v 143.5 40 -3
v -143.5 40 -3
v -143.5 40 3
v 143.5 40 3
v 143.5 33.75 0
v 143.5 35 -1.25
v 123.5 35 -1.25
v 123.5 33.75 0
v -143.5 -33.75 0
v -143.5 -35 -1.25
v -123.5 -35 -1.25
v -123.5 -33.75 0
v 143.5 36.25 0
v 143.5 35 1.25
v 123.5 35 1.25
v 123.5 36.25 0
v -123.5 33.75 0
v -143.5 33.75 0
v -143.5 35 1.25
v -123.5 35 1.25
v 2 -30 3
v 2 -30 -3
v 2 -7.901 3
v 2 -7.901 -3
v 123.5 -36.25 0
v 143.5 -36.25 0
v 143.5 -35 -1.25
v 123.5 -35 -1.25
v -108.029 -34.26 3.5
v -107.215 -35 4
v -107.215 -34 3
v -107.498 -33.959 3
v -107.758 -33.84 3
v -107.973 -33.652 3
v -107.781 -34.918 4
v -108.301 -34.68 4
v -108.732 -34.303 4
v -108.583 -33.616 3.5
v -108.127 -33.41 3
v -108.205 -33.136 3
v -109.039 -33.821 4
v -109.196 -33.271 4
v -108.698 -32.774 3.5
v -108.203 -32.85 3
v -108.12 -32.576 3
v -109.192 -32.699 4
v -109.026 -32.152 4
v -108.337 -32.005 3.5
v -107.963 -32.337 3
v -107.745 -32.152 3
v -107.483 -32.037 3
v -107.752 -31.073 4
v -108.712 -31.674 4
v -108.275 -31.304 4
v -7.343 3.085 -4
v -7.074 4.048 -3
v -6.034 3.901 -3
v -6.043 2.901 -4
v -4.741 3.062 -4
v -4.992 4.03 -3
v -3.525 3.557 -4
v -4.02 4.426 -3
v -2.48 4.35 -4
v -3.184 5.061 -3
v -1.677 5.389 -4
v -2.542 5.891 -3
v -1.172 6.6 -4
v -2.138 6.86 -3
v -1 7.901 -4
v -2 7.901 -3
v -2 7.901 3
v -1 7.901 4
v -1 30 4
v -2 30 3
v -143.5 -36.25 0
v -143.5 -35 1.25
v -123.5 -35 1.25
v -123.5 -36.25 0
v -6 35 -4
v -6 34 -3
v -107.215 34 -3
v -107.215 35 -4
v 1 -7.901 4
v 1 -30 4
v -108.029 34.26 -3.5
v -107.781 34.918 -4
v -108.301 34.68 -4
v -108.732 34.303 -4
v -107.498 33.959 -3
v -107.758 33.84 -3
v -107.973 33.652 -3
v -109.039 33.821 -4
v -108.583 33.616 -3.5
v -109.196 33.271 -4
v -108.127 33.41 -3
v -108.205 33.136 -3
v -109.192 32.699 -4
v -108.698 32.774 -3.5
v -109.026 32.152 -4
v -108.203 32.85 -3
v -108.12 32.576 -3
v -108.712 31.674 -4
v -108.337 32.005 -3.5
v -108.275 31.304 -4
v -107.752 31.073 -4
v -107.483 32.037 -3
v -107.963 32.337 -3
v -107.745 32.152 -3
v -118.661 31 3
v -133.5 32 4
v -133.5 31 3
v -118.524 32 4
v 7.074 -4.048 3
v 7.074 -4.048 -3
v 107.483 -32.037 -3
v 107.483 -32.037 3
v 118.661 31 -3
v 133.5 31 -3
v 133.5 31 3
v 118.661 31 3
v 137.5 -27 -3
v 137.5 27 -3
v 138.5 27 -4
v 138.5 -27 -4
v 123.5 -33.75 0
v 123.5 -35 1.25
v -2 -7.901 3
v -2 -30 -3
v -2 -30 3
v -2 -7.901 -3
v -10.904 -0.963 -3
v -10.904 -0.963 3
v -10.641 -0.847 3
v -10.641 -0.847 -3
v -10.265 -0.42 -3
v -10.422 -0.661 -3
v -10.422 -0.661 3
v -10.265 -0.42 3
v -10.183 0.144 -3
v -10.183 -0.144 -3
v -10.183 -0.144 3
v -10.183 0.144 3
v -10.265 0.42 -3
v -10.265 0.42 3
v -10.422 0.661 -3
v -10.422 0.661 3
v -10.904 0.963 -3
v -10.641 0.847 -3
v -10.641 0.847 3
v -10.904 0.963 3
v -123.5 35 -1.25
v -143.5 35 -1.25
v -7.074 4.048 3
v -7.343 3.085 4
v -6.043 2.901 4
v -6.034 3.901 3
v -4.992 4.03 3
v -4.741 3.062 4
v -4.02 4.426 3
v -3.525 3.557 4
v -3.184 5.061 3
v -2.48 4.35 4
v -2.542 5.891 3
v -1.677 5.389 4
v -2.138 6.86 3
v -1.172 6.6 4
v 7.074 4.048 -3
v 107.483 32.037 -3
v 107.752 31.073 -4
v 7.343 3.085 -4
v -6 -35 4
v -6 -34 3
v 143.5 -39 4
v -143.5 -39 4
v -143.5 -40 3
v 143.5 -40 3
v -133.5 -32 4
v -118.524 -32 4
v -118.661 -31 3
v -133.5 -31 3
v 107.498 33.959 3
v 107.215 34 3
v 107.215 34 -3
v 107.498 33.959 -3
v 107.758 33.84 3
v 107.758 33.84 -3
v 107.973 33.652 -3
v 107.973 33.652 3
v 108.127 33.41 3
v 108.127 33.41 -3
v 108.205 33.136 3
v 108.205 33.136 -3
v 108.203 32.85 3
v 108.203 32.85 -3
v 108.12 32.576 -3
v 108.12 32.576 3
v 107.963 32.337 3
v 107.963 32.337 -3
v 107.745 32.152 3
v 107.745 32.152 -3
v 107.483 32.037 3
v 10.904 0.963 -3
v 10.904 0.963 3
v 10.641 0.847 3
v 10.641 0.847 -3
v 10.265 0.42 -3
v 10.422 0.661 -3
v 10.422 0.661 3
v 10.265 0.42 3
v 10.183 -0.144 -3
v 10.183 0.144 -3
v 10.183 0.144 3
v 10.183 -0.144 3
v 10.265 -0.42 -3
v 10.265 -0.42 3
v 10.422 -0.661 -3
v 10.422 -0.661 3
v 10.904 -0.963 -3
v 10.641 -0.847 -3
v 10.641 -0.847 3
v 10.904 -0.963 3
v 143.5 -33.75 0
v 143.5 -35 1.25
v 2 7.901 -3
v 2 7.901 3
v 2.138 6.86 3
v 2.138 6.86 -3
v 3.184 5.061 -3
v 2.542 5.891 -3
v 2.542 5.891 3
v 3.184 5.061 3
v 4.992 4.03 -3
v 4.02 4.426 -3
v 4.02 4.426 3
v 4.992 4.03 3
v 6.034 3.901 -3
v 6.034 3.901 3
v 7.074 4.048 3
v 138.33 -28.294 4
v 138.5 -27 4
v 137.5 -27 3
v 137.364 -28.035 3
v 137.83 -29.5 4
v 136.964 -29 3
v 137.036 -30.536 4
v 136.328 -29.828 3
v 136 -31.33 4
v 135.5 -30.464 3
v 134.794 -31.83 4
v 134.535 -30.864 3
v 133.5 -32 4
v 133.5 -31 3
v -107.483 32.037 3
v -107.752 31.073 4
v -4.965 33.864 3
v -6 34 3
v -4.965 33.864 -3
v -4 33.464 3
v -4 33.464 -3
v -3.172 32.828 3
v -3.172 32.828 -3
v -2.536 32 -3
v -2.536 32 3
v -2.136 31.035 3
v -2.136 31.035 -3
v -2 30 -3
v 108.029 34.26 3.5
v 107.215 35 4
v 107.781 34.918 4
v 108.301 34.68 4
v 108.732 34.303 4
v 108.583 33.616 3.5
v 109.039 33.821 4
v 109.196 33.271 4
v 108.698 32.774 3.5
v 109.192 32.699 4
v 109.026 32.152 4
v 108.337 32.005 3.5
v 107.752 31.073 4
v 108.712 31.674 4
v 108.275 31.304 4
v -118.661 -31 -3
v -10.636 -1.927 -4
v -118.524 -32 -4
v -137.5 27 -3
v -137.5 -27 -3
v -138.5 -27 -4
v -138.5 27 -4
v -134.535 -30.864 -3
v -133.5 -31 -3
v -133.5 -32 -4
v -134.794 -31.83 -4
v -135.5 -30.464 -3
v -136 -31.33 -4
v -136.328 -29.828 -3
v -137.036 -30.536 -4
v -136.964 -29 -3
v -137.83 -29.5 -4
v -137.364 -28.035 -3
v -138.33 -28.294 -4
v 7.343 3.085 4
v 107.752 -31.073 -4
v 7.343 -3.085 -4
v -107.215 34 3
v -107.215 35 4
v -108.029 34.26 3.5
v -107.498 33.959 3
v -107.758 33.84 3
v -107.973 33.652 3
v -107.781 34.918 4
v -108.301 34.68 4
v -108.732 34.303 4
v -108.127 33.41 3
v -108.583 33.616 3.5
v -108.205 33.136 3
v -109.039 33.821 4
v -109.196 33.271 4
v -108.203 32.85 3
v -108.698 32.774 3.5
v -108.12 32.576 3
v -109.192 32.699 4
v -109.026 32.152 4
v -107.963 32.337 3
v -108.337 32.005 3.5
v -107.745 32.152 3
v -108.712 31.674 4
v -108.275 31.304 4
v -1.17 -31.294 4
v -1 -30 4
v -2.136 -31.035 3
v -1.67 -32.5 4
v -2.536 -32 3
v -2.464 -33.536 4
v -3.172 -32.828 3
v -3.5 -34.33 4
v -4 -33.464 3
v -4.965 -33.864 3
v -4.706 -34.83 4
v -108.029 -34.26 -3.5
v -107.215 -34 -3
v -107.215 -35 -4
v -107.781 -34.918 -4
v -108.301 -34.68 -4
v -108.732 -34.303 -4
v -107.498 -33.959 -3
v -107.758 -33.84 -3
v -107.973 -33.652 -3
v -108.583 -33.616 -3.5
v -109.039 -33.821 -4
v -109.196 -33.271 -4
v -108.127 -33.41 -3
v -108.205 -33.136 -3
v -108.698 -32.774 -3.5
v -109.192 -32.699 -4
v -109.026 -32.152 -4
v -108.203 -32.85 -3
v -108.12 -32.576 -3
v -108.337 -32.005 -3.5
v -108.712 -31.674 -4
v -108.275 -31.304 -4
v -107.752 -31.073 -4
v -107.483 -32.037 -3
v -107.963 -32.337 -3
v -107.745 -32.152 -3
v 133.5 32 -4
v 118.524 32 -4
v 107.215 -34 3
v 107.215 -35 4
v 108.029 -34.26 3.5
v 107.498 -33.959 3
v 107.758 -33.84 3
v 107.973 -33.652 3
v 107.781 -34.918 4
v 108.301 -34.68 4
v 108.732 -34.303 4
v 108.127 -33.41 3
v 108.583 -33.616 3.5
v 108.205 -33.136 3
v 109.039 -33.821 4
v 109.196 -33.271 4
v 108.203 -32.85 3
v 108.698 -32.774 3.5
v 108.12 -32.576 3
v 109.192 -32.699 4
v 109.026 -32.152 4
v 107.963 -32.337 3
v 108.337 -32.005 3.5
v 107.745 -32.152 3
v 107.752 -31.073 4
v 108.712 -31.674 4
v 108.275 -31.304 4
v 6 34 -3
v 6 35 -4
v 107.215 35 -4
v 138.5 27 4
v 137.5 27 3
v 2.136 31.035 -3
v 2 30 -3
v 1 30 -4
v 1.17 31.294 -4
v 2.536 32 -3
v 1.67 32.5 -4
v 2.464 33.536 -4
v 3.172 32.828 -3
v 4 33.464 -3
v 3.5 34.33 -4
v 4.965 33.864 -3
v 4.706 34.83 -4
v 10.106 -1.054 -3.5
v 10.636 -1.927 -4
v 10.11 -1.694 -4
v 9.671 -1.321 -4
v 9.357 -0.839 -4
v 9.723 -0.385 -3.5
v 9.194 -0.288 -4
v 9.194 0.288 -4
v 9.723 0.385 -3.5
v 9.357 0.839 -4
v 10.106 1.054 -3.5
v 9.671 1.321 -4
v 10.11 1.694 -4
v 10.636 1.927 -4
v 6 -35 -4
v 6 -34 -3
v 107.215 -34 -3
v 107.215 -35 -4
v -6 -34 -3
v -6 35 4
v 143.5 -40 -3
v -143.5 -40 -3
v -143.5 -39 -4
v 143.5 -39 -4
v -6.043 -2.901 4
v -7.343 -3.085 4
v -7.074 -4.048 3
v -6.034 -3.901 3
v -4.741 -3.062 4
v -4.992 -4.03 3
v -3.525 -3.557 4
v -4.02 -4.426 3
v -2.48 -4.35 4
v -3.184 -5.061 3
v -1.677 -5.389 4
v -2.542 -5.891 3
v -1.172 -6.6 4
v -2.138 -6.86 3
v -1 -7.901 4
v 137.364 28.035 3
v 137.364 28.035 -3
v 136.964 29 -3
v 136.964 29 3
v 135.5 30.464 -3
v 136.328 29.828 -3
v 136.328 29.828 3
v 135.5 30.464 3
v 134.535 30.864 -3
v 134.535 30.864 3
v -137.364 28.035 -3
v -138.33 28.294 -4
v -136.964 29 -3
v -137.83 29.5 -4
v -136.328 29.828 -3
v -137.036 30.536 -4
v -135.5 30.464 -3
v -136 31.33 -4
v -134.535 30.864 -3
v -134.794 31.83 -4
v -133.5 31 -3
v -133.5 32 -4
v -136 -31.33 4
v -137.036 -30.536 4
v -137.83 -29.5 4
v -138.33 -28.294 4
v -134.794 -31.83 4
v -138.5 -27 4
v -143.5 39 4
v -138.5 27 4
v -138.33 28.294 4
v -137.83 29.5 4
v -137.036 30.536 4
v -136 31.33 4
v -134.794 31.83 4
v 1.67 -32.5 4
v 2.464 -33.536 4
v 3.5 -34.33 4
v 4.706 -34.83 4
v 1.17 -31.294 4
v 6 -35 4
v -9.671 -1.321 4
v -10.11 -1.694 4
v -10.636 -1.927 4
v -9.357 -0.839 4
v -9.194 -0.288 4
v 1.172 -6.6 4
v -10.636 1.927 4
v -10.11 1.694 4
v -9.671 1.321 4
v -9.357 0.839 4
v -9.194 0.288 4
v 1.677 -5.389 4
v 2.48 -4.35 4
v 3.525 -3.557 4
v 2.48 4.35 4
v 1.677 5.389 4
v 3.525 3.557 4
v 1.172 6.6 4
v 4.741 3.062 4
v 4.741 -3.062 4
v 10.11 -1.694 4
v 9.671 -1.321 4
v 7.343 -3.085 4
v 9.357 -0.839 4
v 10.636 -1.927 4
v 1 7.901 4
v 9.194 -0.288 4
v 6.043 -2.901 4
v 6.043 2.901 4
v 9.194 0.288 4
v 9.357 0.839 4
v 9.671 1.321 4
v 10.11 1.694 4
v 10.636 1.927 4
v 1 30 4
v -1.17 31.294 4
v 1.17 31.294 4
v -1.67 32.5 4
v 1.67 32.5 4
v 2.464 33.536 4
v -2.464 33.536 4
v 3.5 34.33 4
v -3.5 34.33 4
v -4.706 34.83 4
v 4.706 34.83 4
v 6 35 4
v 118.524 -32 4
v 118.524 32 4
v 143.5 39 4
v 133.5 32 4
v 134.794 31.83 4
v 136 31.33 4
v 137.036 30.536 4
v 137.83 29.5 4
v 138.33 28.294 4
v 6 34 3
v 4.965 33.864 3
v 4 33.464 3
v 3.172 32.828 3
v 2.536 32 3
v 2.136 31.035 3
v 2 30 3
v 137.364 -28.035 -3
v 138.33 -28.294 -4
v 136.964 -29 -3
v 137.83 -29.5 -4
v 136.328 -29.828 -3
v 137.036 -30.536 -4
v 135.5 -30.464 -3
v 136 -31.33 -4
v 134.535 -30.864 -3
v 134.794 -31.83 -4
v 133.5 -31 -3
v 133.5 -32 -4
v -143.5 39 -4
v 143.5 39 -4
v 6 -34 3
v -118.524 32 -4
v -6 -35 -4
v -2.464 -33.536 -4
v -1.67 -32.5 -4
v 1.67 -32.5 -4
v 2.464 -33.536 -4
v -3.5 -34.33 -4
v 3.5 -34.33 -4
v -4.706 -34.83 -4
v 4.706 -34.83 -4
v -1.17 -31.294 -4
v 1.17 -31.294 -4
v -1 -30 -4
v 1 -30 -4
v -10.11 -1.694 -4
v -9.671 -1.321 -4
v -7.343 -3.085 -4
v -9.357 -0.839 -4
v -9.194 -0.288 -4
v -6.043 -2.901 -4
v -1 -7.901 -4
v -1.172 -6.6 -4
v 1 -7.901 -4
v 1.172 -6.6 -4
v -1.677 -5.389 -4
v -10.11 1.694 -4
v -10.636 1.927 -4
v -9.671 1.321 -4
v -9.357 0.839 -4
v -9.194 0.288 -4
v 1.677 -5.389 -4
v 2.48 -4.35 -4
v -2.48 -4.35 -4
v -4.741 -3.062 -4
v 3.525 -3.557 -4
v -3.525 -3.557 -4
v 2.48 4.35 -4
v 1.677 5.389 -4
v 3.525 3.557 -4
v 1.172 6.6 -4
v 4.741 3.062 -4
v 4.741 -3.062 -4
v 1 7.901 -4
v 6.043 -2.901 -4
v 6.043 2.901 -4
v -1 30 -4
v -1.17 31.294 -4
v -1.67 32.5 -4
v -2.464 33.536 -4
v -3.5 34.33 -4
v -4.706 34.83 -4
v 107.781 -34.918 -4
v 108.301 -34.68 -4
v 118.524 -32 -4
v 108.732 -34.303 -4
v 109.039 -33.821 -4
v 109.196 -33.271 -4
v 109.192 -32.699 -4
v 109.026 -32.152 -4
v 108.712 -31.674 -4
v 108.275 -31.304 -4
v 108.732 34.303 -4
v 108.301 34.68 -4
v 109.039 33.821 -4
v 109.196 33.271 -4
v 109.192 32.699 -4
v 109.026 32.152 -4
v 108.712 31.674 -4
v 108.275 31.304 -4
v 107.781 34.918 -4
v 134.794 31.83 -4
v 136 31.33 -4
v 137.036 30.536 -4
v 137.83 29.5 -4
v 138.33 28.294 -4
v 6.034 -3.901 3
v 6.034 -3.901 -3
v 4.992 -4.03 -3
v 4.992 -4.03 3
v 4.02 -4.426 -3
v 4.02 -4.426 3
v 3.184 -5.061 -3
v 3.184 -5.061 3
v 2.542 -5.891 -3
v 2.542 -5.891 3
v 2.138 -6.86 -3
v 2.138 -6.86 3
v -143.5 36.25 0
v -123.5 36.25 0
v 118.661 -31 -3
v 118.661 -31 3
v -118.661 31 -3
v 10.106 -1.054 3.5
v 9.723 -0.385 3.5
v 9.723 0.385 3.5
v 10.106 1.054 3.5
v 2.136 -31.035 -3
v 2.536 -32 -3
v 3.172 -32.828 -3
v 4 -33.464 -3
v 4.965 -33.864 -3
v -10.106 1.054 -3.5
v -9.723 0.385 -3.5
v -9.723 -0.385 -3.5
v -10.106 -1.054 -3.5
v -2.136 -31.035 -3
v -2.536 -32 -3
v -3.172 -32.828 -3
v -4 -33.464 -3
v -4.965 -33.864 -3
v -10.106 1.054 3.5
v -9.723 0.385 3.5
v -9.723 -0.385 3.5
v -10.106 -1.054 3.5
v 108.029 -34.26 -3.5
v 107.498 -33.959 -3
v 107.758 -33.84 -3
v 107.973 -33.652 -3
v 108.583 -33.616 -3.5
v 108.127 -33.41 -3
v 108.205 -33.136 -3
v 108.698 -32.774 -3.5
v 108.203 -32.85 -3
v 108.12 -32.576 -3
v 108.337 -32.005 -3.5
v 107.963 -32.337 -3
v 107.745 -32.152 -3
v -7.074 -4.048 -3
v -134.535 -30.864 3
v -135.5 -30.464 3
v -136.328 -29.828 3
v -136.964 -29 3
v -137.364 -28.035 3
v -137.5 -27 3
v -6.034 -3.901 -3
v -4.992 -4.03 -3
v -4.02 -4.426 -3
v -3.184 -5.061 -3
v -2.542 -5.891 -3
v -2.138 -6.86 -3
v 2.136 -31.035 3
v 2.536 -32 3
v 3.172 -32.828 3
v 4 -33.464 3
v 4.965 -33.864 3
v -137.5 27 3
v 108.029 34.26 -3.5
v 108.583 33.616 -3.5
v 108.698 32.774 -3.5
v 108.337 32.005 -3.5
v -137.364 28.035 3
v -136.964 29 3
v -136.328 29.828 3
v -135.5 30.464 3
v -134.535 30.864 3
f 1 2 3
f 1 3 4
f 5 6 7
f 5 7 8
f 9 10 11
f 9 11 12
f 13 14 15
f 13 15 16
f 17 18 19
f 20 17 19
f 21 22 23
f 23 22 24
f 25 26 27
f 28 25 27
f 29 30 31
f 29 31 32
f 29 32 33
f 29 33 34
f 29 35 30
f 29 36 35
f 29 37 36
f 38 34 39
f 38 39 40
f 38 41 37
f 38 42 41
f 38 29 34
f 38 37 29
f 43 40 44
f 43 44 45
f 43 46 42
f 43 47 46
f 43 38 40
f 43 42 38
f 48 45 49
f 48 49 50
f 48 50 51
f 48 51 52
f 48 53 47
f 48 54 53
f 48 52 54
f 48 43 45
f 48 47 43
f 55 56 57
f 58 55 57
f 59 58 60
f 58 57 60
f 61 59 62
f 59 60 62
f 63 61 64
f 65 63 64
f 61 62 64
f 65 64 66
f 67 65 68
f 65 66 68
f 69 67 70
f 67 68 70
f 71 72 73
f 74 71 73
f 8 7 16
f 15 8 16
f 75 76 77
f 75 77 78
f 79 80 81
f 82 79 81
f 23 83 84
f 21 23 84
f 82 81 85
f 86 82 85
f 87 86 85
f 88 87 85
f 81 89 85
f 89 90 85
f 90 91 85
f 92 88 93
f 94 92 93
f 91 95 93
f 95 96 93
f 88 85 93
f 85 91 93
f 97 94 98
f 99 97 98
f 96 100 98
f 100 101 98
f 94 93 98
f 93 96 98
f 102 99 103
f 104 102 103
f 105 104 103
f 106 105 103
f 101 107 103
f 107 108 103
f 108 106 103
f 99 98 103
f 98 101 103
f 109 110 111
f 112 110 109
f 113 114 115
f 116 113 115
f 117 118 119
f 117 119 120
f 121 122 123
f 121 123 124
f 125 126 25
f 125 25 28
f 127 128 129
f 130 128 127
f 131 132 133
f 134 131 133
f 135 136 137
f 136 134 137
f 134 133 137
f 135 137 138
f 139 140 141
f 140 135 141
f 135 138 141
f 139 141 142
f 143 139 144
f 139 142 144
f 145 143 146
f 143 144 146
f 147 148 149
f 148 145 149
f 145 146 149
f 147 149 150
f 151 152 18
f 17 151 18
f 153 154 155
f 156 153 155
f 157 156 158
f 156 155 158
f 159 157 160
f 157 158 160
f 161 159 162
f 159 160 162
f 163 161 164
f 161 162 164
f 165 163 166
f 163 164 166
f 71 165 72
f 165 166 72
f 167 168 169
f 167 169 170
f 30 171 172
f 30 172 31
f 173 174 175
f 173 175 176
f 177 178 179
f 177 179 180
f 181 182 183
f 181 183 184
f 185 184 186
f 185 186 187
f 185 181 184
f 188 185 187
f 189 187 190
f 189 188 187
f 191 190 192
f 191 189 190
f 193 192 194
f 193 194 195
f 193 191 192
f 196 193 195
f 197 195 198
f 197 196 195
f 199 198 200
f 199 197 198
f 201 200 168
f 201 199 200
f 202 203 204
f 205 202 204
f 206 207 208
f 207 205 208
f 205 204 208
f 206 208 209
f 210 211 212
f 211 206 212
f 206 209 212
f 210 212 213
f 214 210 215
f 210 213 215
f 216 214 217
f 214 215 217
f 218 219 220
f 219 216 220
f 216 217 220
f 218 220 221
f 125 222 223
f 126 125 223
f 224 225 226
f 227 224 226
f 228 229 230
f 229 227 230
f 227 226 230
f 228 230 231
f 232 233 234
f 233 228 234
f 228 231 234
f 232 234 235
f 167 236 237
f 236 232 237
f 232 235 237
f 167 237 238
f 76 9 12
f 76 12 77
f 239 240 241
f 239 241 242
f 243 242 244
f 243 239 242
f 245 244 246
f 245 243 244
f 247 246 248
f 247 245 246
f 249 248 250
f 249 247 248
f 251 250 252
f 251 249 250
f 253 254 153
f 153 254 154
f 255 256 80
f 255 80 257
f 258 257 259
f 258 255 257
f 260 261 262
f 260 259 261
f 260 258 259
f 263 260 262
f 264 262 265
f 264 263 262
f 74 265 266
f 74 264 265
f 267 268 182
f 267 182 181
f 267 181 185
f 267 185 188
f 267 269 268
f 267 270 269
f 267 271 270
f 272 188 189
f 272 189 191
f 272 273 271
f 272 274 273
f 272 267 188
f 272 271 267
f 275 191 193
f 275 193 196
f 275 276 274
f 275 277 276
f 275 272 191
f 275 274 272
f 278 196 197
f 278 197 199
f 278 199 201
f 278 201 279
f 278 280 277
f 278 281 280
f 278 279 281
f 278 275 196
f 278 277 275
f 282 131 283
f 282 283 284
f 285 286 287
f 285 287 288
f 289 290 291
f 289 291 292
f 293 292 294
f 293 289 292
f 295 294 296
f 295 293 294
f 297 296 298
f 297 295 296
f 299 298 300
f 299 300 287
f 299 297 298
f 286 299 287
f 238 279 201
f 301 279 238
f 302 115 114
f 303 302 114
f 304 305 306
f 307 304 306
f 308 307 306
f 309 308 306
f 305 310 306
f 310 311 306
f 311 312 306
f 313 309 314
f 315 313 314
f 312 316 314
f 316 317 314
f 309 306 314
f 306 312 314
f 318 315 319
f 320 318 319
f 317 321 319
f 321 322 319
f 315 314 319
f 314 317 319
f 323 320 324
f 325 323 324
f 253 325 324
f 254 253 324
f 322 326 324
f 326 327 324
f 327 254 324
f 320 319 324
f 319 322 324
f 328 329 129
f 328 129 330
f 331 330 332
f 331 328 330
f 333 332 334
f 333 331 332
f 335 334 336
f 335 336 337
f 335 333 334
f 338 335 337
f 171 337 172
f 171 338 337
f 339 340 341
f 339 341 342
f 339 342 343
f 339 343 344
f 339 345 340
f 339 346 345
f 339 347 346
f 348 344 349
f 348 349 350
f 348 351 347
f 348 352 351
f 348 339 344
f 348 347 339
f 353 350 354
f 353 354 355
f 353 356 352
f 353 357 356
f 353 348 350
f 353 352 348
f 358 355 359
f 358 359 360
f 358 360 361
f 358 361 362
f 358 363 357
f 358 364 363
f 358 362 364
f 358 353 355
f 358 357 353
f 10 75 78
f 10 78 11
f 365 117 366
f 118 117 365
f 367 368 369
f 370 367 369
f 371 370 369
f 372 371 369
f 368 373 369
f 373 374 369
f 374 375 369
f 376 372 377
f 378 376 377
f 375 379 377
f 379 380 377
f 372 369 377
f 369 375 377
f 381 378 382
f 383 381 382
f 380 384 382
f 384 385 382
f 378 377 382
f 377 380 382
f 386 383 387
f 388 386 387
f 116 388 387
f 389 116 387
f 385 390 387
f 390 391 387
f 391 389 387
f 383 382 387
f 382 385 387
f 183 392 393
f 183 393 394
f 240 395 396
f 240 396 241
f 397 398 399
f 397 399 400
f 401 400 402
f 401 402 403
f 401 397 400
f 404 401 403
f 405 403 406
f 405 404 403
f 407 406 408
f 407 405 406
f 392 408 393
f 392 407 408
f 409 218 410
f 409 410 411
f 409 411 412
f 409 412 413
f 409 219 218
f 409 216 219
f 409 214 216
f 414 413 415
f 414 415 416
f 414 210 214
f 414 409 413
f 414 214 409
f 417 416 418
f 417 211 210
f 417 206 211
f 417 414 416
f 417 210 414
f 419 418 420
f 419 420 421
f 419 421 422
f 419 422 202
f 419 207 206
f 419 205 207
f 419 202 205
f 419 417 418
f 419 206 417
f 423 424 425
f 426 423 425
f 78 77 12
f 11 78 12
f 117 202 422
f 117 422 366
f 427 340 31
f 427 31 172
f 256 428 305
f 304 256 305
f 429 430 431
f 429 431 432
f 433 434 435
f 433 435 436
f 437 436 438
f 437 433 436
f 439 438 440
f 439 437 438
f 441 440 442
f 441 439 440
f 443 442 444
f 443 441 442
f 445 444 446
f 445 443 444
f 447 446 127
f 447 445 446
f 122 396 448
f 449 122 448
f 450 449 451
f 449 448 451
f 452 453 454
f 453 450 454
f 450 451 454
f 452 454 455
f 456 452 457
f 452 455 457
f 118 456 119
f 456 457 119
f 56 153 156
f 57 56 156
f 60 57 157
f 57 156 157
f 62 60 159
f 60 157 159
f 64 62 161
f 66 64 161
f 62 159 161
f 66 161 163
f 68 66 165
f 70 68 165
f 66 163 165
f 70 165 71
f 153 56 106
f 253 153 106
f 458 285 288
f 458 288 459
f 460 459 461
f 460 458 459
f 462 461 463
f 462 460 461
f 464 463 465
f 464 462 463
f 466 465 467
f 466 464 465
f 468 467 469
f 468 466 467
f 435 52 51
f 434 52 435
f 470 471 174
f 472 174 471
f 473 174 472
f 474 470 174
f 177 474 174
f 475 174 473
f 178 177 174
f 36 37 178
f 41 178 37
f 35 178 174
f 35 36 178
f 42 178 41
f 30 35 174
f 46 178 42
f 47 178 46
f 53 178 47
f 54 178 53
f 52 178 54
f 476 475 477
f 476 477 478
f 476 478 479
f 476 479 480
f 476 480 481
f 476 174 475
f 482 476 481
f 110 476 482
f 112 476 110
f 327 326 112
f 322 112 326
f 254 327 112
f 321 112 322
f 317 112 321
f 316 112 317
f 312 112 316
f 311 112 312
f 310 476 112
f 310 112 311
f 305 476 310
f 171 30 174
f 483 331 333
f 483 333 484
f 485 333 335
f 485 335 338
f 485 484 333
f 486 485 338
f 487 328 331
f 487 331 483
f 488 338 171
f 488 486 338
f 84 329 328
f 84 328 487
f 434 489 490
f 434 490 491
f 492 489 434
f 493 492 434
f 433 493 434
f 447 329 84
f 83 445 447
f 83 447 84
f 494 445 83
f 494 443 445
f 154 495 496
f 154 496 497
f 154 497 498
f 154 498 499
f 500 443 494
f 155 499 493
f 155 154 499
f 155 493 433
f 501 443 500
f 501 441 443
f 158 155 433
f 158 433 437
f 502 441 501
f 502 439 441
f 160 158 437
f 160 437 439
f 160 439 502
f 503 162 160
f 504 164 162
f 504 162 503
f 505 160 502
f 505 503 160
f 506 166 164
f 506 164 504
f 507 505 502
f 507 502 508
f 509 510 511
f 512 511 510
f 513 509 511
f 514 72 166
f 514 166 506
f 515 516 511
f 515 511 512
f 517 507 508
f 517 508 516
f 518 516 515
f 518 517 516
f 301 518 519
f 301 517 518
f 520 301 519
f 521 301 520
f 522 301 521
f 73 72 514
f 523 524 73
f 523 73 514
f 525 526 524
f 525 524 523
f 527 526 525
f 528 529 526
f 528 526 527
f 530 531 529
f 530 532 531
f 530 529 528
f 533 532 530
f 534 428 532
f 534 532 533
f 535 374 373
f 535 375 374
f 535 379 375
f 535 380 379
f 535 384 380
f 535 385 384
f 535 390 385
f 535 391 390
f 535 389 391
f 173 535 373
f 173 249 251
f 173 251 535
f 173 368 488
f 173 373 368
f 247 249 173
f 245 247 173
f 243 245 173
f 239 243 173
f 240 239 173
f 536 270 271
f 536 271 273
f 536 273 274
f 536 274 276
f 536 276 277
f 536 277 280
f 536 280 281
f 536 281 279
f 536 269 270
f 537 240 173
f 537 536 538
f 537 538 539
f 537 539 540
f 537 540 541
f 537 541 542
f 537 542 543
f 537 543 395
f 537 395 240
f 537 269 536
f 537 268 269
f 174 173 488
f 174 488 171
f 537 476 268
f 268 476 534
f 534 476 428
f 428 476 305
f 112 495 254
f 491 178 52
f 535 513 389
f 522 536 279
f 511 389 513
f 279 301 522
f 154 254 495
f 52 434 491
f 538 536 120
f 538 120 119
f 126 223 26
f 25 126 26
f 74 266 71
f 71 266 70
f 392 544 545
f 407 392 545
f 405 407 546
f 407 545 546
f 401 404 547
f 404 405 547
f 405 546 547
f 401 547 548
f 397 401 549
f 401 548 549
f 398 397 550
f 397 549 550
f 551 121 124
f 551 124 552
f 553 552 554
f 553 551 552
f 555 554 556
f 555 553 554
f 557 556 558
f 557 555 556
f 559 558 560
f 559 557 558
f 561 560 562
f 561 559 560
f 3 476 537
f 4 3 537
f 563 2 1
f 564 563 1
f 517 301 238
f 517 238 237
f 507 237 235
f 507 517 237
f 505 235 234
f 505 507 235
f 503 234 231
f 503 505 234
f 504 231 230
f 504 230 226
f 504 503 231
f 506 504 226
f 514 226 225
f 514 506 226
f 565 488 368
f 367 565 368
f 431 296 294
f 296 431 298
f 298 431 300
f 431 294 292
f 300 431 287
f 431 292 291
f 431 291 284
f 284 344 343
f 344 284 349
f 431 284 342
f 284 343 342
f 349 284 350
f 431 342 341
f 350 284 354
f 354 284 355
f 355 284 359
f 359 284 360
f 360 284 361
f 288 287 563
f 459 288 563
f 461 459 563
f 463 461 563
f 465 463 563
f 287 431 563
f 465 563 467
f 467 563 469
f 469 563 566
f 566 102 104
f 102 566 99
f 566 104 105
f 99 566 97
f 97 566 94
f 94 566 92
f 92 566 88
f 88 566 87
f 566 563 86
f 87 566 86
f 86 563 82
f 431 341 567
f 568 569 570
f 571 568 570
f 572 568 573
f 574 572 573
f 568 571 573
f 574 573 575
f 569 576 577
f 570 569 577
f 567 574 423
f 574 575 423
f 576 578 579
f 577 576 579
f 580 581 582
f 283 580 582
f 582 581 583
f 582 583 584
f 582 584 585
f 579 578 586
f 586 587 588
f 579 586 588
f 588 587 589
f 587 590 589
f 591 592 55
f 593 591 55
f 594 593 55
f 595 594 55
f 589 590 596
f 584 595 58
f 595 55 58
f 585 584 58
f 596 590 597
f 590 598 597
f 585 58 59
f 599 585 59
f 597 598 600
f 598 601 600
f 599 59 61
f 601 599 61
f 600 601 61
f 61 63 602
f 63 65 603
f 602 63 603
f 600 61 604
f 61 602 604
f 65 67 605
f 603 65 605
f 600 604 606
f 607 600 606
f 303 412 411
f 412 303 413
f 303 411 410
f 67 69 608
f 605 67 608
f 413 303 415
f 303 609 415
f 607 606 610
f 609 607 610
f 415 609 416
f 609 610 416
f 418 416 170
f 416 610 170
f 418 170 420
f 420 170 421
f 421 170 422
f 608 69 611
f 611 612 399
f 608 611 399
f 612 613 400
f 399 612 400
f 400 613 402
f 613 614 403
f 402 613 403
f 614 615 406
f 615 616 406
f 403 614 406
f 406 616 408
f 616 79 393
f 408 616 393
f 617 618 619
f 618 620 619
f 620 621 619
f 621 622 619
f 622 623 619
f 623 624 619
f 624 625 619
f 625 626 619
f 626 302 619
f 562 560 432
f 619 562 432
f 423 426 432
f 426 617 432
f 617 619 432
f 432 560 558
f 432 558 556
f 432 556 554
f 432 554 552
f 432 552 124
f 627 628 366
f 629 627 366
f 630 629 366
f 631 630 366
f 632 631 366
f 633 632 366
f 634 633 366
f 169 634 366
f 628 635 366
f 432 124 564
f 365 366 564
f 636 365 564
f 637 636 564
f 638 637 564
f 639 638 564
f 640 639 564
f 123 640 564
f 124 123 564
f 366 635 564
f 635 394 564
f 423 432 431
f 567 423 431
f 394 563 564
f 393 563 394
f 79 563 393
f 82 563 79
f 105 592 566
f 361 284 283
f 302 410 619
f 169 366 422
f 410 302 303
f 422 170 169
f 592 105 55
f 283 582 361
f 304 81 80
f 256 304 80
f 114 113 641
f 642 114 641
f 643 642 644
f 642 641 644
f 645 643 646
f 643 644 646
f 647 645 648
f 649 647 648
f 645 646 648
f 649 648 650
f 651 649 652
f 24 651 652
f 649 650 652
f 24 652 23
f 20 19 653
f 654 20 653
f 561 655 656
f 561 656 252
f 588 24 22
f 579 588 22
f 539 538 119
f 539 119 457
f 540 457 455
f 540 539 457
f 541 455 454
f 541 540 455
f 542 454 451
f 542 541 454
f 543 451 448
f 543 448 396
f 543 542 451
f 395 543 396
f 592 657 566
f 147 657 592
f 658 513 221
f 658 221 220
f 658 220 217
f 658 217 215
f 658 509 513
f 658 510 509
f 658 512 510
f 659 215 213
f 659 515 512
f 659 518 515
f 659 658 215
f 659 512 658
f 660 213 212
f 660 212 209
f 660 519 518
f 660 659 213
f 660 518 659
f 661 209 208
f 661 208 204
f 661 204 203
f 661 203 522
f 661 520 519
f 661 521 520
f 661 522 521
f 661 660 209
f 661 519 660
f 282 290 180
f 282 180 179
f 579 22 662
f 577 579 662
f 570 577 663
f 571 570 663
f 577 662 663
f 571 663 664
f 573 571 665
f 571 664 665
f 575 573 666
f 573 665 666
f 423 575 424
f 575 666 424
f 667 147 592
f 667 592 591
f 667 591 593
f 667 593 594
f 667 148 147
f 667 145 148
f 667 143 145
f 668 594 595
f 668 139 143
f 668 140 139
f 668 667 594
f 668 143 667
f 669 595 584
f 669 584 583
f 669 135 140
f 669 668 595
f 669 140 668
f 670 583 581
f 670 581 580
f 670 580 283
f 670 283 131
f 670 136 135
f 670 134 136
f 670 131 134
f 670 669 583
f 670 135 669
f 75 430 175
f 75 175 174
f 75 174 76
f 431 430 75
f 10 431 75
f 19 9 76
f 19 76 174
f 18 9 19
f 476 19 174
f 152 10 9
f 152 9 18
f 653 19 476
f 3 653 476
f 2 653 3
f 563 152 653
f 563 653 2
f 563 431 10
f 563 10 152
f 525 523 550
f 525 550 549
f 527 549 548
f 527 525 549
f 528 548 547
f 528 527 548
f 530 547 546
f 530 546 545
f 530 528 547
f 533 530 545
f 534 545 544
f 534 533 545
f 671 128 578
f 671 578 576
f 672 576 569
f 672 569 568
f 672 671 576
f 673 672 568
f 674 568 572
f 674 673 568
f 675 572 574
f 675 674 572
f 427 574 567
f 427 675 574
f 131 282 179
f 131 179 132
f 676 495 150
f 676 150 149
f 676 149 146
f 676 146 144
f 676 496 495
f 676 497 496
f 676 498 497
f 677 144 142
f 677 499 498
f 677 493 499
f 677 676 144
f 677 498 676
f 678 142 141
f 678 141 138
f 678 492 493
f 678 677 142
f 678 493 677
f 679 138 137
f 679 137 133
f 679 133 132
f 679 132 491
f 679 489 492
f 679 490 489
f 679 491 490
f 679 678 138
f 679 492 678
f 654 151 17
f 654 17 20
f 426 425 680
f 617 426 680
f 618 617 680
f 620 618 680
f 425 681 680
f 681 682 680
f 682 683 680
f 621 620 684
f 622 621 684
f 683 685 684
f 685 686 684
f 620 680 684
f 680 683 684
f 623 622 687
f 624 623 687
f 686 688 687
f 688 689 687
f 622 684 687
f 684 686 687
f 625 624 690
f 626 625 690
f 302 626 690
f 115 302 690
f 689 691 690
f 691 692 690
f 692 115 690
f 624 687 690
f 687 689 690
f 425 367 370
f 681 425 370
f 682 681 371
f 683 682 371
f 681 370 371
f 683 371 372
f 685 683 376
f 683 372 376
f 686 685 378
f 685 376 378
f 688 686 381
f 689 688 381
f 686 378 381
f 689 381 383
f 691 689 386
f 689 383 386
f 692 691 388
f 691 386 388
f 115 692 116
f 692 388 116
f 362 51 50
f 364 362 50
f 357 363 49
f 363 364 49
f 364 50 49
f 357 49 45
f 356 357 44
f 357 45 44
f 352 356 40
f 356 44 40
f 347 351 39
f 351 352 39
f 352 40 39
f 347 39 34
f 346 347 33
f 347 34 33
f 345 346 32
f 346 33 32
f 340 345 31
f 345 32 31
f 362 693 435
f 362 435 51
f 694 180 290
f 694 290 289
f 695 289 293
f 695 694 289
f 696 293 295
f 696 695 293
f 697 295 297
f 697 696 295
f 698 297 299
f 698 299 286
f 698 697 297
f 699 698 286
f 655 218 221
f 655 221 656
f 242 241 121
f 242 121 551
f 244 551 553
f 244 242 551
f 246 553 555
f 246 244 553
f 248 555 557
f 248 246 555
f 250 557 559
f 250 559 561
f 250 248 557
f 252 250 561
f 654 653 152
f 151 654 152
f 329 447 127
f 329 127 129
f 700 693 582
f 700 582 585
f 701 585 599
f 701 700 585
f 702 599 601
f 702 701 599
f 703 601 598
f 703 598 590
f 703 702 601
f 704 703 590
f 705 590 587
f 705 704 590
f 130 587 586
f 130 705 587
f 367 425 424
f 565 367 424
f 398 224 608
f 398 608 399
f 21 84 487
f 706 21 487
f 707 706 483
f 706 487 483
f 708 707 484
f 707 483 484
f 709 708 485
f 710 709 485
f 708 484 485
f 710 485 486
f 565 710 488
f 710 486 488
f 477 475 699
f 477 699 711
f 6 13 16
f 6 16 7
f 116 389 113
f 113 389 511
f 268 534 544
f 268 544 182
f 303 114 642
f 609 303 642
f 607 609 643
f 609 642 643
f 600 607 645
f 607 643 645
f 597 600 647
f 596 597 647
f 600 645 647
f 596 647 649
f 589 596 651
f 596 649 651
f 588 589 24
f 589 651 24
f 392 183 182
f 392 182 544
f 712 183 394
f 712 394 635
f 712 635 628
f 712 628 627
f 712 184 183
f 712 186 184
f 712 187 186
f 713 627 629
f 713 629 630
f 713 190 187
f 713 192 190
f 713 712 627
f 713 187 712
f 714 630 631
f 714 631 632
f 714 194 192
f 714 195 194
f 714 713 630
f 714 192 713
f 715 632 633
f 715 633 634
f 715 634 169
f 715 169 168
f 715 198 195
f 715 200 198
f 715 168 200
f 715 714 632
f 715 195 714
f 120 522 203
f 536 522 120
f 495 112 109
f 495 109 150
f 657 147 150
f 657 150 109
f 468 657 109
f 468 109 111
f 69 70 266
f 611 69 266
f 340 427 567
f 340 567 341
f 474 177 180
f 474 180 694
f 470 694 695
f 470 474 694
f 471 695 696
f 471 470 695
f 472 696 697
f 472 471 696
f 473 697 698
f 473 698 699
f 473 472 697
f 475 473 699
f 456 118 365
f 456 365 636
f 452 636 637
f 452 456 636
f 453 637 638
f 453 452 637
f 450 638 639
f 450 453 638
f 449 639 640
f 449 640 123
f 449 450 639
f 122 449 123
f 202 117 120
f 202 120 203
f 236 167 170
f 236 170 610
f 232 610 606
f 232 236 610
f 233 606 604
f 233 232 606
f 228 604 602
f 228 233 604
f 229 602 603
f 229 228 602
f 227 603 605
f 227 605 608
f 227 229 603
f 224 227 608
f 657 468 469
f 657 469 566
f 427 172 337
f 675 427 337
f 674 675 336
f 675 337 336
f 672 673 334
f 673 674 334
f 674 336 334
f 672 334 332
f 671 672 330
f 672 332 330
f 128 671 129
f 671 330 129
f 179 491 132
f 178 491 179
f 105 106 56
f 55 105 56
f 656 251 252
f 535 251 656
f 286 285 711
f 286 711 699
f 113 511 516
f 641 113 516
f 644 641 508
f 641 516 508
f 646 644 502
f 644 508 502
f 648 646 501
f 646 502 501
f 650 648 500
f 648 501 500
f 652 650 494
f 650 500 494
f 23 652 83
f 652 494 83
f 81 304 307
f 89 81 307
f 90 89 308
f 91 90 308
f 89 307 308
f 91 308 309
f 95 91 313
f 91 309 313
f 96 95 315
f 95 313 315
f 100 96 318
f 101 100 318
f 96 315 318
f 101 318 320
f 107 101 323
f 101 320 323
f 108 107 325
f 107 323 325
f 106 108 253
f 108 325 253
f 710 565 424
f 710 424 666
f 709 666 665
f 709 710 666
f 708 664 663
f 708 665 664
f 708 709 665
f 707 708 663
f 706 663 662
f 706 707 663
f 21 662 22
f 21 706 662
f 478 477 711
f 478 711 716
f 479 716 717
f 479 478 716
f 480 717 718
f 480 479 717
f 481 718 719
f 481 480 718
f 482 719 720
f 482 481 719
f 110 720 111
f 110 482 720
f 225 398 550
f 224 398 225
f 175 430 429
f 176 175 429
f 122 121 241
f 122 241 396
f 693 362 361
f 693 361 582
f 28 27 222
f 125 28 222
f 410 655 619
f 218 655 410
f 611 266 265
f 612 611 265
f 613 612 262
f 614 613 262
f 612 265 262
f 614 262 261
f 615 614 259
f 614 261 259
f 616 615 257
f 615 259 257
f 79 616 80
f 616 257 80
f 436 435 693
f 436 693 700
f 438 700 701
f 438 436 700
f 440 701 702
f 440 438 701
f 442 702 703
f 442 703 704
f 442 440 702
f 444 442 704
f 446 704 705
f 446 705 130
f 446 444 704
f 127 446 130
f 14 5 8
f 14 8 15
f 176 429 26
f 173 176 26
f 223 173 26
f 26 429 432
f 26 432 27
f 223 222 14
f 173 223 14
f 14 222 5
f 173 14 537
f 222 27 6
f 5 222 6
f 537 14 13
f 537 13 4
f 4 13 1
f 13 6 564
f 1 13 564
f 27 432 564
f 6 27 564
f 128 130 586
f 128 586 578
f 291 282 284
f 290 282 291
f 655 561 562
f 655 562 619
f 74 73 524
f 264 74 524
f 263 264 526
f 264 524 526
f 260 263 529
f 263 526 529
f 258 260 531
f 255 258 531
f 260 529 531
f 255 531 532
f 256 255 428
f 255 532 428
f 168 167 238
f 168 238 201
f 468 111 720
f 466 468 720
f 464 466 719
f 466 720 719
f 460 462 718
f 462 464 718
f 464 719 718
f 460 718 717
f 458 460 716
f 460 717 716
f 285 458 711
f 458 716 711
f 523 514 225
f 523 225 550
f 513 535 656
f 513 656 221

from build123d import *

# Parameters (mm, degrees)
AUFSATZ_LINEAR_AUSTRAGEN1_DEPTH      = 4
AUFSATZ_LINEAR_AUSTRAGEN1_DEPTH_BACK = 4
SKIZZE1_W                            = 287
SKIZZE1_H                            = 80
SCHNITT_LINEAR_AUSTRAGEN1_DEPTH      = 20
SCHNITT_LINEAR_AUSTRAGEN2_DEPTH      = 150.024326873
SCHNITT_LINEAR_AUSTRAGEN2_DEPTH_BACK = 150.024326873
VERRUNDUNG1_R                        = 4
VERRUNDUNG2_R                        = 1
FASE1_SIZE                           = 1


with BuildPart() as part:
    # Skizze1 → Aufsatz-Linear austragen1 (new, two sides: drawn at the far end of the back side and taken through both)
    with BuildSketch(Plane.XY.offset(-AUFSATZ_LINEAR_AUSTRAGEN1_DEPTH_BACK)):
        Rectangle(SKIZZE1_W, SKIZZE1_H)
    extrude(amount=AUFSATZ_LINEAR_AUSTRAGEN1_DEPTH + AUFSATZ_LINEAR_AUSTRAGEN1_DEPTH_BACK)

    # Skizze2 → Schnitt-Linear austragen1 (cut)
    with BuildSketch(Plane.ZY.offset(143.5)):
        Polygon((1.25, 35), (0, 36.25), (-1.25, 35), (0, 33.75), align=None)
        Polygon((-1.25, -35), (0, -33.75), (1.25, -35), (0, -36.25), align=None)
    schnitt_linear_austragen1 = extrude(amount=-SCHNITT_LINEAR_AUSTRAGEN1_DEPTH, mode=Mode.SUBTRACT)

    # Spiegeln1: Schnitt-Linear austragen1 across plane
    add(schnitt_linear_austragen1.mirror(Plane(origin=(0, 0, 0), x_dir=(0, 0, 1), z_dir=(1, 0, 0))), mode=Mode.SUBTRACT)

    # Skizze3 → Schnitt-Linear austragen2 (cut, two sides: drawn at the far end of the back side and taken through both)
    with BuildSketch(Plane.XY.offset(-SCHNITT_LINEAR_AUSTRAGEN2_DEPTH_BACK)):
        Polygon((-114.526468265, 34), (-2, 34), (-2, 2.633737069), align=None)
        Polygon((-137.5, 31), (-137.5, 0), (-137.5, -31), (-118.661031735, -31), (-7.448531735, 0), (-118.661031735, 31), align=None)
        Polygon((-2, -34), (-2, -2.633737069), (-114.526468265, -34), align=None)
        Polygon((118.661031735, -31), (137.5, -31), (137.5, 0), (137.5, 31), (118.661031735, 31), (7.448531735, 0), align=None)
        Polygon((114.526468265, -34), (2, -34), (2, -2.633737069), align=None)
        Polygon((2, 2.633737069), (114.526468265, 34), (2, 34), align=None)
    extrude(amount=SCHNITT_LINEAR_AUSTRAGEN2_DEPTH + SCHNITT_LINEAR_AUSTRAGEN2_DEPTH_BACK, mode=Mode.SUBTRACT)

    # Verrundung1
    verrundung1_edges = [part.edges().sort_by_distance(p)[0] for p in [
        (2, -2.633737069, 0),
        (2, -34, 0),
        (137.5, 31, 0),
        (137.5, -31, 0),
        (2, 2.633737069, 0),
        (2, 34, 0),
        (-2, 2.633737069, 0),
        (-2, 34, 0),
        (-2, -34, 0),
        (-2, -2.633737069, 0),
        (-137.5, -31, 0),
        (-137.5, 31, 0),
    ]]
    fillet(verrundung1_edges, radius=VERRUNDUNG1_R)

    # Verrundung2
    verrundung2_edges = [part.edges().sort_by_distance(p)[0] for p in [
        (-7.448531735, 0, 0),
        (114.526468265, -34, 0),
        (7.448531735, 0, 0),
        (114.526468265, 34, 0),
        (-114.526468265, 34, 0),
        (-114.526468265, -34, 0),
    ]]
    fillet(verrundung2_edges, radius=VERRUNDUNG2_R)

    # Fase1
    fase1_edges = [part.edges().sort_by_distance(p)[0] for p in [
        (0, -40, -4),
        (-64.782660021, -15.981638547, -4),
        (-64.782660021, -15.981638547, 4),
        (-126.080515867, 31, 4),
        (64.782660021, 15.981638547, -4),
        (126.080515867, -31, -4),
        (126.080515867, -31, 4),
        (64.782660021, 15.981638547, 4),
        (0, 40, 4),
        (0, -40, 4),
        (137.5, 0, -4),
        (137.5, 0, 4),
        (126.080515867, 31, -4),
        (126.080515867, 31, 4),
        (56.607351199, -34, -4),
        (56.607351199, -34, 4),
        (2, -18.950605603, -4),
        (2, -18.950605603, 4),
        (57.278624435, 18.04241287, -4),
        (57.278624435, 18.04241287, 4),
        (2, 18.950605603, -4),
        (2, 18.950605603, 4),
        (-2, 18.950605603, -4),
        (-2, 18.950605603, 4),
        (-57.278624435, -18.04241287, -4),
        (-57.278624435, -18.04241287, 4),
        (-2, -18.950605603, -4),
        (-2, -18.950605603, 4),
        (-56.607351199, 34, -4),
        (-56.607351199, 34, 4),
        (-126.080515867, -31, -4),
        (-126.080515867, -31, 4),
        (-137.5, 0, -4),
        (-137.5, 0, 4),
        (136.328427125, -29.828427125, 4),
        (136.328427125, -29.828427125, -4),
        (136.328427125, 29.828427125, 4),
        (136.328427125, 29.828427125, -4),
        (3.171572875, -32.828427125, 4),
        (3.171572875, -32.828427125, -4),
        (3.58092463, -4.71560697, 4),
        (3.58092463, -4.71560697, -4),
        (3.58092463, 4.71560697, 4),
        (3.58092463, 4.71560697, -4),
        (3.171572875, 32.828427125, 4),
        (3.171572875, 32.828427125, -4),
        (-3.58092463, 4.71560697, 4),
        (-3.58092463, 4.71560697, -4),
        (-3.58092463, -4.71560697, 4),
        (-3.58092463, -4.71560697, -4),
        (-3.171572875, -32.828427125, 4),
        (-3.171572875, -32.828427125, -4),
        (-3.171572875, 32.828427125, 4),
        (-3.171572875, 32.828427125, -4),
        (-136.328427125, -29.828427125, 4),
        (-136.328427125, -29.828427125, -4),
        (-136.328427125, 29.828427125, 4),
        (-136.328427125, 29.828427125, -4),
        (57.278624435, -18.04241287, 4),
        (57.278624435, -18.04241287, -4),
        (56.607351199, 34, 4),
        (56.607351199, 34, -4),
        (64.782660021, -15.981638547, -4),
        (64.782660021, -15.981638547, 4),
        (-64.782660021, 15.981638547, -4),
        (-64.782660021, 15.981638547, 4),
        (-56.607351199, -34, 4),
        (-56.607351199, -34, -4),
        (-57.278624435, 18.04241287, 4),
        (-57.278624435, 18.04241287, -4),
        (108.205479137, -33.13550444, 4),
        (108.205479137, -33.13550444, -4),
        (108.205479137, 33.13550444, 4),
        (108.205479137, 33.13550444, -4),
        (10.172797602, 0, 4),
        (10.172797602, 0, -4),
        (-10.172797602, 0, 4),
        (-10.172797602, 0, -4),
        (-108.205479137, -33.13550444, 4),
        (-108.205479137, -33.13550444, -4),
        (-108.205479137, 33.13550444, 4),
        (-108.205479137, 33.13550444, -4),
        (0, 40, -4),
        (-126.080515867, 31, -4),
    ]]
    chamfer(fase1_edges, length=FASE1_SIZE)


solid = part.part
